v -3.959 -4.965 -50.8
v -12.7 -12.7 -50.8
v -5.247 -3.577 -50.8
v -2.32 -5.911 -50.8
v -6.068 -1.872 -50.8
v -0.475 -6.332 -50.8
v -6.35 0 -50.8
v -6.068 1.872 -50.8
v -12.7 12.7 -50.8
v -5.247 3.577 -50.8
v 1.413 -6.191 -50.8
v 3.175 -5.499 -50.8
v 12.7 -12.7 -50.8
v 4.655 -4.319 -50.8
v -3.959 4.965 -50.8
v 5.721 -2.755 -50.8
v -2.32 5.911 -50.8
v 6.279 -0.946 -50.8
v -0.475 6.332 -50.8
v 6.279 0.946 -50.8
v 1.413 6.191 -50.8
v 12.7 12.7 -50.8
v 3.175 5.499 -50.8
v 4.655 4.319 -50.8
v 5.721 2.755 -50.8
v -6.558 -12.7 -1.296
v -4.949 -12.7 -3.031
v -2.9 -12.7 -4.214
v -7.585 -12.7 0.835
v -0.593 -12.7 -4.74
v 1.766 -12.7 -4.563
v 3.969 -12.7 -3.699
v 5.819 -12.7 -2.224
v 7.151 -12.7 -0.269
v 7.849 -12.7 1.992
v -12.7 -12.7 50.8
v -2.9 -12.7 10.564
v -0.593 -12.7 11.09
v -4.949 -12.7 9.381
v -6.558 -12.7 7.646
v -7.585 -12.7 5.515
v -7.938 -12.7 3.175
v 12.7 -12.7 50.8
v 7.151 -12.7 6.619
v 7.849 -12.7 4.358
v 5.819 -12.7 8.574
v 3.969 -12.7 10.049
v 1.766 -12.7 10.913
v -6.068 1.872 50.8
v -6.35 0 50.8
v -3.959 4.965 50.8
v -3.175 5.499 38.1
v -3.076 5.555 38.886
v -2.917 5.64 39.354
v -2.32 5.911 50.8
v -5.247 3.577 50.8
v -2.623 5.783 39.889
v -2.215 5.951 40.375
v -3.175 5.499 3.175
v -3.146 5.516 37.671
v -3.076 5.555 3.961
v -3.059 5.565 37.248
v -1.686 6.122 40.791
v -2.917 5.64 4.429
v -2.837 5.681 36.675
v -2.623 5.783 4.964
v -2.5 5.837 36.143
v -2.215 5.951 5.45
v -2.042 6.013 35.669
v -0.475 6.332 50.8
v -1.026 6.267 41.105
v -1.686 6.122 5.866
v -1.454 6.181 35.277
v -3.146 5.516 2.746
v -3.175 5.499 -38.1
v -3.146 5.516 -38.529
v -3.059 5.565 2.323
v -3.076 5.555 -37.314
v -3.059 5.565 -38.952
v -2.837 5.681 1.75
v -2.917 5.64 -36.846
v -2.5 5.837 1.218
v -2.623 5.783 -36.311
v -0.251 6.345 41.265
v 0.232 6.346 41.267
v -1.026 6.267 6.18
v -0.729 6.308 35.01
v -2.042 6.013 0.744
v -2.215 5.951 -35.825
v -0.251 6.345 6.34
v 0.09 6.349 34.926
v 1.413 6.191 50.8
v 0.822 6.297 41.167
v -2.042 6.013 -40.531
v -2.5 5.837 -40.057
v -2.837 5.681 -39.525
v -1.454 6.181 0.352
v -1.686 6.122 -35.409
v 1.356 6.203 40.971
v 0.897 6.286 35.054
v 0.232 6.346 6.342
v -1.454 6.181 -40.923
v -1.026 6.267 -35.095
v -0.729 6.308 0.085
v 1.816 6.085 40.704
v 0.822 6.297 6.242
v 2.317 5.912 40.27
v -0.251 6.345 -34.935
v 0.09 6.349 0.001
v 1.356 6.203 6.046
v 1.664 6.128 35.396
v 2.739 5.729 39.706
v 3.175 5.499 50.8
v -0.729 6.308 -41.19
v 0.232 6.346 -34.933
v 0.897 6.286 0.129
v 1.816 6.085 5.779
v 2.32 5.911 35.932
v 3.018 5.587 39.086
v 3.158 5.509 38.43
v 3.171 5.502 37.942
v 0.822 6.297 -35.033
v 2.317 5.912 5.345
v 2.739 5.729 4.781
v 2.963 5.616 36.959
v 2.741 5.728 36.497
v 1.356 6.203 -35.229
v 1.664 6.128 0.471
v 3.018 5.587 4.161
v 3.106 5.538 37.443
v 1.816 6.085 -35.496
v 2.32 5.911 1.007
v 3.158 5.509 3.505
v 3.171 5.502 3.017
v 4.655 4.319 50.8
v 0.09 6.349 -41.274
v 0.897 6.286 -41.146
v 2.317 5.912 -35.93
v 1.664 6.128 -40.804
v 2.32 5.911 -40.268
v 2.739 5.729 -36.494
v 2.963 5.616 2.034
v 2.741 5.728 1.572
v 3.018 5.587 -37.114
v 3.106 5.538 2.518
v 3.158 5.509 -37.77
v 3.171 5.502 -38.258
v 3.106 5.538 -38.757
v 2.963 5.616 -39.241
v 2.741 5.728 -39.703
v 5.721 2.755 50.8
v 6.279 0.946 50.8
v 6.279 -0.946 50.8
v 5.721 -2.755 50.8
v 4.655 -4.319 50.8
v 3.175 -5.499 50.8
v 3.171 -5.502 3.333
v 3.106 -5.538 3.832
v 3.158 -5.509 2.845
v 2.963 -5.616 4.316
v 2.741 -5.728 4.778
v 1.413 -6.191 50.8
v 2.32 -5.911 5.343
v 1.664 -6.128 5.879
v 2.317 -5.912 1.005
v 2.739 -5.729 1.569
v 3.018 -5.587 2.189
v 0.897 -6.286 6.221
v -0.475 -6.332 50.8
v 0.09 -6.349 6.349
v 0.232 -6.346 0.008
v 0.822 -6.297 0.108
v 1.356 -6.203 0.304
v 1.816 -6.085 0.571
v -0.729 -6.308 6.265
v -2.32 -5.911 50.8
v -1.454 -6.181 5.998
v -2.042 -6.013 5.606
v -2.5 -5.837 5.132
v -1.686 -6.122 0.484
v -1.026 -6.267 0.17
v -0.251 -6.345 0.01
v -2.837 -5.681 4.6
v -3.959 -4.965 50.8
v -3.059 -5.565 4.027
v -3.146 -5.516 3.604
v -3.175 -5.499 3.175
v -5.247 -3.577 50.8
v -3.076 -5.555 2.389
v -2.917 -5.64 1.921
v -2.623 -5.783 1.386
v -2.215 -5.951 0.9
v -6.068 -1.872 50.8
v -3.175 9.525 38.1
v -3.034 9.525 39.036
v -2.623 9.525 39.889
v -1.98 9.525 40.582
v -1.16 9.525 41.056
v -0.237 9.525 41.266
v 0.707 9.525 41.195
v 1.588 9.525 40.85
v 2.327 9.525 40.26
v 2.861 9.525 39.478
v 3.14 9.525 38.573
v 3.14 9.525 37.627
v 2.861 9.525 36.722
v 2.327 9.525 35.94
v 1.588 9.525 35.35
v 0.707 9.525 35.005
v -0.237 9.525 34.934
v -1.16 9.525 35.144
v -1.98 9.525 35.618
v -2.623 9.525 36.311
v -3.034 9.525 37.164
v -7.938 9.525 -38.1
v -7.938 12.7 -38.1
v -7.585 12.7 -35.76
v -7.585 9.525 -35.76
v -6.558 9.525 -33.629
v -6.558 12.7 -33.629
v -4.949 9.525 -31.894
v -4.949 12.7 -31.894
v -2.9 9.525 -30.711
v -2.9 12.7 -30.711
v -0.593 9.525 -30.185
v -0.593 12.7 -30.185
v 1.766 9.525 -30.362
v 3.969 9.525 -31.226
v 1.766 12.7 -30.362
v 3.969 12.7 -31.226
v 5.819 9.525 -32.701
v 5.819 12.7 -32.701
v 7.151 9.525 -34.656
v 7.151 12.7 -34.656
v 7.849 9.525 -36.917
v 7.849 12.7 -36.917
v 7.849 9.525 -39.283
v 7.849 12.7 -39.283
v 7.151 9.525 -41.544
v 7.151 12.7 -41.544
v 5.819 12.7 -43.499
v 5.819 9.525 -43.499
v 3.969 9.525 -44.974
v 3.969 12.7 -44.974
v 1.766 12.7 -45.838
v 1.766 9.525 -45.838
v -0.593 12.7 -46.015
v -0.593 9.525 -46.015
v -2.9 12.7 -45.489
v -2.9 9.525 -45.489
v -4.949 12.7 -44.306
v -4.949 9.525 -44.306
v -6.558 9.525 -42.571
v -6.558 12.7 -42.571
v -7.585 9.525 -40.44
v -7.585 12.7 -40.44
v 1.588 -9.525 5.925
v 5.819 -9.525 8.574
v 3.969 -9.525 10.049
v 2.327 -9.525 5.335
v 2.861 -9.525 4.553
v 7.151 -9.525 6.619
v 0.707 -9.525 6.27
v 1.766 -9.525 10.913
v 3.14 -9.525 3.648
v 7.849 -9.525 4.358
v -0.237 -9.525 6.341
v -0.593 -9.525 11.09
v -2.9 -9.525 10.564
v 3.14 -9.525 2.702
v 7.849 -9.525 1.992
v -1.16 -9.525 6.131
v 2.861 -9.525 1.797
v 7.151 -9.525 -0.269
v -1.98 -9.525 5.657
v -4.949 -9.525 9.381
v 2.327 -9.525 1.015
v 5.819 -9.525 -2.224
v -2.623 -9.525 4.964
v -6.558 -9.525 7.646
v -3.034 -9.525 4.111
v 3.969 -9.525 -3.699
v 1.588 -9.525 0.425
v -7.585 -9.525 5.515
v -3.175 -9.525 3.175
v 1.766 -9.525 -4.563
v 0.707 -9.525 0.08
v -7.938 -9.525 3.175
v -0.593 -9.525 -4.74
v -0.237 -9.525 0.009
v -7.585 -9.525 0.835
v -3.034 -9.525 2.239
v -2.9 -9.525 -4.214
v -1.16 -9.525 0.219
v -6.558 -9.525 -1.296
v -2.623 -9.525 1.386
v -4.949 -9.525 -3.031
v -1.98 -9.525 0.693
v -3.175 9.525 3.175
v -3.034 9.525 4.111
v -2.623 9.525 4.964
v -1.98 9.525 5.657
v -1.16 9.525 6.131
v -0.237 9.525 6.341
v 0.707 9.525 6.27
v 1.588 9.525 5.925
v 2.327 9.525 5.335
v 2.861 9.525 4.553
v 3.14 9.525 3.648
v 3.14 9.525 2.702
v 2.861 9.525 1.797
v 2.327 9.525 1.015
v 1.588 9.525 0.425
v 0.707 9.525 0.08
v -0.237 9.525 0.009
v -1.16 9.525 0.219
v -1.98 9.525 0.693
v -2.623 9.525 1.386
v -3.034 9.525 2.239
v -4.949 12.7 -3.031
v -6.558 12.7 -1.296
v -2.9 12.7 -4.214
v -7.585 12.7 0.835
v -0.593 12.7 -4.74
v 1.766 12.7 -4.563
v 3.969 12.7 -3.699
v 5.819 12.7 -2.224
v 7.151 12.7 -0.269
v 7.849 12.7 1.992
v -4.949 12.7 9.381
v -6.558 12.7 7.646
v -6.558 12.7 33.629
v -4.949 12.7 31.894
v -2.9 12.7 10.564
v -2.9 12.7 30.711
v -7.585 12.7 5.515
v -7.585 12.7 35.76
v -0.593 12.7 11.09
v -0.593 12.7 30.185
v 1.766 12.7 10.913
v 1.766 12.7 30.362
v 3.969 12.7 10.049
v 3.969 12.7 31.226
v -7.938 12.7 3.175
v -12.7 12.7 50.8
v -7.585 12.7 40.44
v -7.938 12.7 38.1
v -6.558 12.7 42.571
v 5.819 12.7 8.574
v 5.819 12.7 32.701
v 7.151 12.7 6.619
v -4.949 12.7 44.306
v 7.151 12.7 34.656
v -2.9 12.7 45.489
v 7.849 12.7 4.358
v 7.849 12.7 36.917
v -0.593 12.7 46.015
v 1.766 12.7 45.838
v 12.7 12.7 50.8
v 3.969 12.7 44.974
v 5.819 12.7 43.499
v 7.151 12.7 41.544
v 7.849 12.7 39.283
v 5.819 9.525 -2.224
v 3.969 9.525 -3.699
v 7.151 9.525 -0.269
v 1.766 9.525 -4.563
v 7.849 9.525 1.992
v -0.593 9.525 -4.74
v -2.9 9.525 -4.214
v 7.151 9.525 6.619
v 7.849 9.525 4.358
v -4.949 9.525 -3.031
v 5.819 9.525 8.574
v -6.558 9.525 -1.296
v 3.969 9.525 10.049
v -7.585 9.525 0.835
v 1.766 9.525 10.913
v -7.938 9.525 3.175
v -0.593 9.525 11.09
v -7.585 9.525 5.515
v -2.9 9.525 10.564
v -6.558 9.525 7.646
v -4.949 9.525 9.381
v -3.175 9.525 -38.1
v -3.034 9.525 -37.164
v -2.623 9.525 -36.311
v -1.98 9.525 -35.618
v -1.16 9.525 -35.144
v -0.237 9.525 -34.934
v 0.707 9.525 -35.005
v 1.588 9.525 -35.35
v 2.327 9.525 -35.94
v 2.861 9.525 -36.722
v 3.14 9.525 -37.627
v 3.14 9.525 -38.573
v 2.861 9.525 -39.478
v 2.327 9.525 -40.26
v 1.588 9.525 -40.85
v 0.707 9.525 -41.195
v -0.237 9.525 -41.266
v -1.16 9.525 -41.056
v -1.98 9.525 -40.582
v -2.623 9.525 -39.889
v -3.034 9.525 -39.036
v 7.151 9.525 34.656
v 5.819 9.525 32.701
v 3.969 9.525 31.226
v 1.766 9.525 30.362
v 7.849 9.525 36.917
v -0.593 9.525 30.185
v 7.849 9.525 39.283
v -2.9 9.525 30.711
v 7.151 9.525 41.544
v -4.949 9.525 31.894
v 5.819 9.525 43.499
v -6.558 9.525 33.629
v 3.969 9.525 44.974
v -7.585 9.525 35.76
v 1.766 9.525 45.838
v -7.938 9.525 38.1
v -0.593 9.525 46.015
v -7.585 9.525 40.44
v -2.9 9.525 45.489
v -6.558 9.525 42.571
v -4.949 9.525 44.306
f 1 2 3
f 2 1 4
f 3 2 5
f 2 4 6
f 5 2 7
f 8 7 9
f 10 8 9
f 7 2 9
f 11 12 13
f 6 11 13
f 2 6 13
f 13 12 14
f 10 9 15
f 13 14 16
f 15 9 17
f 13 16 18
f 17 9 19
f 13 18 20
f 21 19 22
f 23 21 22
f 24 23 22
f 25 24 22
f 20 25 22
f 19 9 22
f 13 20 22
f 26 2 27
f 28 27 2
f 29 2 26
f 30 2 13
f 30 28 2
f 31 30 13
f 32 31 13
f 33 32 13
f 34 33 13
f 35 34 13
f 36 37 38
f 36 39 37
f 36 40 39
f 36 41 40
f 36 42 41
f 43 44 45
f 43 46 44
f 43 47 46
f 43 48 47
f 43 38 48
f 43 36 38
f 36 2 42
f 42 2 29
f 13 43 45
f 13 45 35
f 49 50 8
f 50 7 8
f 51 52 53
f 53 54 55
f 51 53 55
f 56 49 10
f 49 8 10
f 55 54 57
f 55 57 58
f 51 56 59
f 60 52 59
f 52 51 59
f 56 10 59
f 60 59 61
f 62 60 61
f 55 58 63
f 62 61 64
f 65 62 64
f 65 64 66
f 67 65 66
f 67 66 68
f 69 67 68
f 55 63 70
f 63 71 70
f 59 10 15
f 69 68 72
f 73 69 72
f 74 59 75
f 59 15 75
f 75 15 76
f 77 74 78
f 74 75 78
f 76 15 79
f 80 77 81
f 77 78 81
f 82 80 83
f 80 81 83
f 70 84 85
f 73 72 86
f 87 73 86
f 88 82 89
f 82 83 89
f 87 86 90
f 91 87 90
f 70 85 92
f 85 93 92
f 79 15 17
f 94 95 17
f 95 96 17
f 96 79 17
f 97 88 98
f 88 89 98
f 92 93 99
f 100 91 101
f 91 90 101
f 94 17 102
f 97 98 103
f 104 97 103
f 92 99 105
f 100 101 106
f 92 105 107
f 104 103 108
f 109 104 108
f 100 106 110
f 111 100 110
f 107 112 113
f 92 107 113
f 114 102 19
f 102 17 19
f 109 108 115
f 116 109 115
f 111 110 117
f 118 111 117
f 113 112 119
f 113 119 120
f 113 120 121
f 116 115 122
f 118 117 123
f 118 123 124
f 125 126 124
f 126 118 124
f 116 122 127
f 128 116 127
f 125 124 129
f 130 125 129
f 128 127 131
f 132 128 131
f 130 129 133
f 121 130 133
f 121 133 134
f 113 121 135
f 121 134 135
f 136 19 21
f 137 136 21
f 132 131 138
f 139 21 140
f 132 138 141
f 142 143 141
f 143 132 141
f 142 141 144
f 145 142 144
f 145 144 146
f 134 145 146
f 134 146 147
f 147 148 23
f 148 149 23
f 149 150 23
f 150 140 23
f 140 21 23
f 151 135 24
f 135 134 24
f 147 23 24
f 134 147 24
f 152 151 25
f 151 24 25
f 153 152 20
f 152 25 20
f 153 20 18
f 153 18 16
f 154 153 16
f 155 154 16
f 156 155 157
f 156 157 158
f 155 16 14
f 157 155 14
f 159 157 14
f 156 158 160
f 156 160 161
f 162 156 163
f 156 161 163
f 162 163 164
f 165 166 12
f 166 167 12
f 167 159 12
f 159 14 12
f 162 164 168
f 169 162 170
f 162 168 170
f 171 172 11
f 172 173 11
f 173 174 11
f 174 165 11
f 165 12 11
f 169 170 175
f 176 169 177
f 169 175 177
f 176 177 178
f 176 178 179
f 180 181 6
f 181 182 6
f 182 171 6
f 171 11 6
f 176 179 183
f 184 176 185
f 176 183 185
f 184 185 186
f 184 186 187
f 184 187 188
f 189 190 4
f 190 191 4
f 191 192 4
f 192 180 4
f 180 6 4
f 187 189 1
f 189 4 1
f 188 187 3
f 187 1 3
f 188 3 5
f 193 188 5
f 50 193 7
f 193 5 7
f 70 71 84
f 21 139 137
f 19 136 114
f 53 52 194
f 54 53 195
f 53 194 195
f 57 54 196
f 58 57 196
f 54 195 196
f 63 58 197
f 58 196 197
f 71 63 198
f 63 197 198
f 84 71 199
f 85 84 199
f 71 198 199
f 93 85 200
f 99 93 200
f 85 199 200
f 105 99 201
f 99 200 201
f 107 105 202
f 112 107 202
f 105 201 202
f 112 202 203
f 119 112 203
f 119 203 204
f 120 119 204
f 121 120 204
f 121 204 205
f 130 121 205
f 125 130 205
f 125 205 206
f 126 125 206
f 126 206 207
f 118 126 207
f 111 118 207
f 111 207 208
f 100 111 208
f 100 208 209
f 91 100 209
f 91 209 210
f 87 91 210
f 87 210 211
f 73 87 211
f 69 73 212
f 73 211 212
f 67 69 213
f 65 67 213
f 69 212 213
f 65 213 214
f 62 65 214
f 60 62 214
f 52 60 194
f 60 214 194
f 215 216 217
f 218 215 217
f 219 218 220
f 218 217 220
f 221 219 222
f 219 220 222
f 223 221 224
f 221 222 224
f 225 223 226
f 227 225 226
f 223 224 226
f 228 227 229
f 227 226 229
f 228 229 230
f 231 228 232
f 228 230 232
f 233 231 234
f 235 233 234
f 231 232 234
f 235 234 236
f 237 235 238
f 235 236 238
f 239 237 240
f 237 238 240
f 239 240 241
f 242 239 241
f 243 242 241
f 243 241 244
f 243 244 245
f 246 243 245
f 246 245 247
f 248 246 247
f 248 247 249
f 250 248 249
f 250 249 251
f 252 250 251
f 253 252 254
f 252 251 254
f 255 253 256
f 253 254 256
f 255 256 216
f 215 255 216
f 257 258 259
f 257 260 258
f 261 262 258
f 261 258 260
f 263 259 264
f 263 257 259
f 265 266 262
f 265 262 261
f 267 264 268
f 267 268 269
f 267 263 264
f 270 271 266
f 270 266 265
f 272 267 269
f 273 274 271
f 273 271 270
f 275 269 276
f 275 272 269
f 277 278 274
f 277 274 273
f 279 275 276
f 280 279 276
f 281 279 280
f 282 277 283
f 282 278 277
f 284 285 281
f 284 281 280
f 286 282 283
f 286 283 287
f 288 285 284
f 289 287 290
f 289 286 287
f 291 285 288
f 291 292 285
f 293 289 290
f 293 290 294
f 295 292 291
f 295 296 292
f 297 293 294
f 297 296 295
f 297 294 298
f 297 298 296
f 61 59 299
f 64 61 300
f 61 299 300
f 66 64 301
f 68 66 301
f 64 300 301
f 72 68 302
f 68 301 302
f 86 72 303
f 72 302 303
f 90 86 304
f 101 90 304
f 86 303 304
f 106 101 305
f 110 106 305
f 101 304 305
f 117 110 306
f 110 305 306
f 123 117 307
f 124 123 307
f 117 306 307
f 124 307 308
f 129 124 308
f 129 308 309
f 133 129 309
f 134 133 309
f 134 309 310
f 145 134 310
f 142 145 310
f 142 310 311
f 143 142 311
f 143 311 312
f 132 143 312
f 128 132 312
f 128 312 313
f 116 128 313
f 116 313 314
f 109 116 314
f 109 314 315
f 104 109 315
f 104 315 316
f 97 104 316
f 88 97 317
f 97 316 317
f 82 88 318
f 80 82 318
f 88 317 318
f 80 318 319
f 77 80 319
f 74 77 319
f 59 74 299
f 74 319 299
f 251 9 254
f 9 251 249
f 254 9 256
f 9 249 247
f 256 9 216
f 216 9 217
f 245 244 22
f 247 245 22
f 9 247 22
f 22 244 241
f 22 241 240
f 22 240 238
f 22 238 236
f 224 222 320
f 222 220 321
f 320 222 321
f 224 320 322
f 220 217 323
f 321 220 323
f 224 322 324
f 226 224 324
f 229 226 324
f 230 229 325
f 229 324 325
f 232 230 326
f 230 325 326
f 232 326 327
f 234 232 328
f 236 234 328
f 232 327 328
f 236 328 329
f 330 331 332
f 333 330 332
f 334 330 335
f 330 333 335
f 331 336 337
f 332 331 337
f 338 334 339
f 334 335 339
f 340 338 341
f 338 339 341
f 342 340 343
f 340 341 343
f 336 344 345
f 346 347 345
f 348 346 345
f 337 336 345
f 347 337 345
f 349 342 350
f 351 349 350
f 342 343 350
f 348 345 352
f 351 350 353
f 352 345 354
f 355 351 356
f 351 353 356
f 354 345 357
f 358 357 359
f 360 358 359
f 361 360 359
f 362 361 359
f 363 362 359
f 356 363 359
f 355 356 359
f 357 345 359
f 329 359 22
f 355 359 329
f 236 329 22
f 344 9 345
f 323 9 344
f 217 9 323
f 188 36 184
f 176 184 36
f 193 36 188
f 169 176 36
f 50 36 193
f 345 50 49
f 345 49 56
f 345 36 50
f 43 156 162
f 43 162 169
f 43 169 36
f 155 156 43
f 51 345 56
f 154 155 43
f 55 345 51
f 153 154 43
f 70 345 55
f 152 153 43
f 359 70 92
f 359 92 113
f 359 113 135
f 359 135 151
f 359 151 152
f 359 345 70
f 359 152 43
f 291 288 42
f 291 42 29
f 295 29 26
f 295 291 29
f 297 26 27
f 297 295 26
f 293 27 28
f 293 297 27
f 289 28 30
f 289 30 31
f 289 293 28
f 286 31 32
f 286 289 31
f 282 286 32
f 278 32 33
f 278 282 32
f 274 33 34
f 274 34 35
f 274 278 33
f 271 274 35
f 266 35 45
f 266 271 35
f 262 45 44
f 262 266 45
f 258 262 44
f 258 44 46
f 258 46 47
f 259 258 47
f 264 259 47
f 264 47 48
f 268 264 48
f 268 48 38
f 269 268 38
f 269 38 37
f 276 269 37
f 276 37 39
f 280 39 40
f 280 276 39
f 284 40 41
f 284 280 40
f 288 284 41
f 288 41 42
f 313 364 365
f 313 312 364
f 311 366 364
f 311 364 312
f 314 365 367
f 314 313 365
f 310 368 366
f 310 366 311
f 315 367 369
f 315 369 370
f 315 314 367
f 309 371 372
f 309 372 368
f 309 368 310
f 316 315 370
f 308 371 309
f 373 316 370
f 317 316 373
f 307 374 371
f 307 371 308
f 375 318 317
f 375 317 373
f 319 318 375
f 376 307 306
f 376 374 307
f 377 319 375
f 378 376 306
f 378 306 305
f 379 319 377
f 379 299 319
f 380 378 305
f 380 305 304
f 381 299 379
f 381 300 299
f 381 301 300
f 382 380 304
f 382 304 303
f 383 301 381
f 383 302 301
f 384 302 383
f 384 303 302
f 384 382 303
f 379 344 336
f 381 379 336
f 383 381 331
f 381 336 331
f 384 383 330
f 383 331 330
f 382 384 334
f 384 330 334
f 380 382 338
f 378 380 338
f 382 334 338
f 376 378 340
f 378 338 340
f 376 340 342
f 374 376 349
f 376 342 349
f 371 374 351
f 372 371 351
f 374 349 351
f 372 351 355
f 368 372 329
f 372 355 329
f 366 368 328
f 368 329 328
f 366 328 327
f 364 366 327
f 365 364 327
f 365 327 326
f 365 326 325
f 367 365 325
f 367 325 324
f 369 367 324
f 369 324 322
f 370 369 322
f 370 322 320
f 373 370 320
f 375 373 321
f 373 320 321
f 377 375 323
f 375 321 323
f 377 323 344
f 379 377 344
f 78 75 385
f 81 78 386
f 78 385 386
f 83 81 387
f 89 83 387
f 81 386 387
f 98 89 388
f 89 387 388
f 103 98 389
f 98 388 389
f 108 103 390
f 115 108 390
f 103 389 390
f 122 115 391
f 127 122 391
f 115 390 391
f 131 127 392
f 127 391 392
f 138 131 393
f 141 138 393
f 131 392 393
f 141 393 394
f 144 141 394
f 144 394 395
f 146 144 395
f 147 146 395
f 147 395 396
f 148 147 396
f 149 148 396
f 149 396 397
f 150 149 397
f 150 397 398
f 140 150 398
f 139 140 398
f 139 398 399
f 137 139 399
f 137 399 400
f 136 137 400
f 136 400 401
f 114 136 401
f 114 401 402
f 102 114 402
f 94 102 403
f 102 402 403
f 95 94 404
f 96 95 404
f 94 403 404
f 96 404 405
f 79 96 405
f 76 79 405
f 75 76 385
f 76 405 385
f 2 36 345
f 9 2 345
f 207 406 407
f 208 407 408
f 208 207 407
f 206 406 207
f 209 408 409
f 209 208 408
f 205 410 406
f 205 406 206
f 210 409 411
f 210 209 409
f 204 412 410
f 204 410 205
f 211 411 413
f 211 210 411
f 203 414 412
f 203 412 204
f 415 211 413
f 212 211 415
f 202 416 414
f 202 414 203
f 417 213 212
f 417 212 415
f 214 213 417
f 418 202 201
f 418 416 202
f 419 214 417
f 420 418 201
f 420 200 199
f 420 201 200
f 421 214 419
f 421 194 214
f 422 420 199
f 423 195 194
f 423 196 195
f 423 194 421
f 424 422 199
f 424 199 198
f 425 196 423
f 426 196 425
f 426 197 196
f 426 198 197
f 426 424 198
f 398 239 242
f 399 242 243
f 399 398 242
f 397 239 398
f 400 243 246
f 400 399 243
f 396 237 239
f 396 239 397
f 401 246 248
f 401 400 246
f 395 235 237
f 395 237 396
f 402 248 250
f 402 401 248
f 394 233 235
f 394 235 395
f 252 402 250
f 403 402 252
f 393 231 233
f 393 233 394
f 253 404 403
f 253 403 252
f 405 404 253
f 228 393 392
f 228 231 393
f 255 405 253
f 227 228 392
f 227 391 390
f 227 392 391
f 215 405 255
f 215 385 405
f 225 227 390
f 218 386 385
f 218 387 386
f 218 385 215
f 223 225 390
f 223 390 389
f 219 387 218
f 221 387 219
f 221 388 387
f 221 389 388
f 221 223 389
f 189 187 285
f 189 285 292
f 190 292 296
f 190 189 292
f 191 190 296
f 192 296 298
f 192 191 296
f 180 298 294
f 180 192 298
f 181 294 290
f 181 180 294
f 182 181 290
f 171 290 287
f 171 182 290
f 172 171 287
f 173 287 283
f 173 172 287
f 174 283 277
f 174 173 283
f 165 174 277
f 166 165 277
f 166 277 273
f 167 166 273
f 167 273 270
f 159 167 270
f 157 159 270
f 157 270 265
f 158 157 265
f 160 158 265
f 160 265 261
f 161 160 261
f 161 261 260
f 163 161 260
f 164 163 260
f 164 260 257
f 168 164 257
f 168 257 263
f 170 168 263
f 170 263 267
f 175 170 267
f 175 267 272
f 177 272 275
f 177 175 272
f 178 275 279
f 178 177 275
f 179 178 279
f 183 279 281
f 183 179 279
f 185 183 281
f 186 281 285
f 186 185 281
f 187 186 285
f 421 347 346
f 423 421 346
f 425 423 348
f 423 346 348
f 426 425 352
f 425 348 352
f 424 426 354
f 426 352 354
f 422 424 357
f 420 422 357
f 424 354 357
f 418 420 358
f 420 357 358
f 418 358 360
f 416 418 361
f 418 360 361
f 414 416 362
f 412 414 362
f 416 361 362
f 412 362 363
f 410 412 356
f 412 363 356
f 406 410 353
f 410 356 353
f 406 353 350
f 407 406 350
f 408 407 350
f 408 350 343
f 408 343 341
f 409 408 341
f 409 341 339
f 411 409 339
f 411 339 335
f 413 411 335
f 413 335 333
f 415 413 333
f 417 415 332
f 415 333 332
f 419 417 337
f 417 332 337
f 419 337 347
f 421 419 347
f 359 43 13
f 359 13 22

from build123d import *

# Parameters (mm, degrees)
SKETCH18_W                 = 25.4
SKETCH18_H                 = 25.4
BOSS_EXTRUDE3_DEPTH        = 50.8
F_1_2_0_5_DIAMETER_HOLE2_D = 12.7
SKETCH26_R                 = 3.175
CUT_EXTRUDE10_DEPTH        = 12.7
SKETCH27_R                 = 7.9375
CUT_EXTRUDE11_DEPTH        = 3.175
CUT_EXTRUDE12_START        = -12.7
SKETCH28_R                 = 3.175
CUT_EXTRUDE12_DEPTH        = 12.7
CUT_EXTRUDE13_START        = -3.175
SKETCH29_R                 = 7.9375
CUT_EXTRUDE13_DEPTH        = 3.175


with BuildPart() as part:
    # Sketch18 → Boss-Extrude3 (new, symmetric)
    with BuildSketch(Plane.XY):
        Rectangle(SKETCH18_W, SKETCH18_H)
    extrude(amount=BOSS_EXTRUDE3_DEPTH, both=True)

    # 1/2 (0.5) Diameter Hole2 (through all)
    with Locations(Plane.XY.offset(50.8)):
        with Locations((0, 0)):
            Hole(F_1_2_0_5_DIAMETER_HOLE2_D / 2)

    # Sketch26 → Cut-Extrude10 (cut)
    with BuildSketch(Plane(origin=(0, 12.7, 0), x_dir=(1, 0, 0), z_dir=(0, 1, 0))):
        with Locations(Location((0, -38.1, 0), (0, 0, 180))):
            Circle(SKETCH26_R)
        with Locations(Location((0, -3.175, 0), (0, 0, 180))):
            Circle(SKETCH26_R)
        with Locations(Location((0, 38.1, 0), (0, 0, 180))):
            Circle(SKETCH26_R)
    extrude(amount=-CUT_EXTRUDE10_DEPTH, mode=Mode.SUBTRACT)

    # Sketch27 → Cut-Extrude11 (cut)
    with BuildSketch(Plane(origin=(0, 12.7, 0), x_dir=(1, 0, 0), z_dir=(0, 1, 0))):
        with Locations(Location((0, 38.1, 0), (0, 0, 180))):
            Circle(SKETCH27_R)
        with Locations(Location((0, -3.175, 0), (0, 0, 180))):
            Circle(SKETCH27_R)
        with Locations(Location((0, -38.1, 0), (0, 0, 180))):
            Circle(SKETCH27_R)
    extrude(amount=-CUT_EXTRUDE11_DEPTH, mode=Mode.SUBTRACT)

    # Sketch28 → Cut-Extrude12 (cut)
    with BuildSketch(Plane.XZ.offset(12.7).offset(CUT_EXTRUDE12_START)):
        with Locations(Location((0, 3.175, 0), (0, 0, 180))):
            Circle(SKETCH28_R)
    extrude(amount=CUT_EXTRUDE12_DEPTH, mode=Mode.SUBTRACT)

    # Sketch29 → Cut-Extrude13 (cut)
    with BuildSketch(Plane(origin=(0, -12.7, 0), x_dir=(-1, 0, 0), z_dir=(0, -1, 0)).offset(CUT_EXTRUDE13_START)):
        with Locations((0, -3.175)):
            Circle(SKETCH29_R)
    extrude(amount=CUT_EXTRUDE13_DEPTH, mode=Mode.SUBTRACT)


solid = part.part
